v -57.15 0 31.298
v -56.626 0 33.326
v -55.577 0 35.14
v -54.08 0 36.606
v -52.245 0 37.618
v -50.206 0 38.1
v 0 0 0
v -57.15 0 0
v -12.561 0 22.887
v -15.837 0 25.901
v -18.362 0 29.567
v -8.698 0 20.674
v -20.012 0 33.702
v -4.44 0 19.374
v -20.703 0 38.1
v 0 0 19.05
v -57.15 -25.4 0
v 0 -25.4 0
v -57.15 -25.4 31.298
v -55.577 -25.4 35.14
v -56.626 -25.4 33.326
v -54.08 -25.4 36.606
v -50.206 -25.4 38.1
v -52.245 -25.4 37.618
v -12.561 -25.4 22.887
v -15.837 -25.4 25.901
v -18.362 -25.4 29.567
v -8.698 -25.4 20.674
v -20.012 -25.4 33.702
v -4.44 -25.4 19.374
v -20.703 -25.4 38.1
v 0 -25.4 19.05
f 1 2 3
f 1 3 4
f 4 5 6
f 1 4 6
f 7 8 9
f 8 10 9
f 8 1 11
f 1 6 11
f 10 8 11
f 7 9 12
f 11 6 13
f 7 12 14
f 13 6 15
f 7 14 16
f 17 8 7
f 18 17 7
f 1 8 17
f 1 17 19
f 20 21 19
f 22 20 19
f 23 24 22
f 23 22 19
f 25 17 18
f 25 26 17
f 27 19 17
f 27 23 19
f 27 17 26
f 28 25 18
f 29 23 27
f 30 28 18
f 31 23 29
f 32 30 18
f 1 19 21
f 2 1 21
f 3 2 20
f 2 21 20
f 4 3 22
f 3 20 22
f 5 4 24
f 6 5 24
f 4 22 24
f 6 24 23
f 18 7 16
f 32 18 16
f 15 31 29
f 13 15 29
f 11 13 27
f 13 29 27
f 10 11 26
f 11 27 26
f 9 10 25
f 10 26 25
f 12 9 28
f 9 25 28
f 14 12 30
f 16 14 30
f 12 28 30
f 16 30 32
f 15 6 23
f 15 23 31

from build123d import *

# Parameters (mm, degrees)
F0_W     = 57.15
F0_H     = 38.1
F1_DEPTH = 25.4
F3_DEPTH = 25.4


with BuildPart() as f1:
    # F0 (on Front) → F1 (new body)
    with BuildSketch(Plane.XZ):
        with Locations((-28.575, 19.05)):
            Rectangle(F0_W, F0_H)
    extrude(amount=F1_DEPTH)

    # F2 (on face) → F3 (cut)
    with BuildSketch(Plane.XZ.offset(25.4)):
        with BuildLine():
            Line((0, 38.1), (-20.702738, 38.1))
            ThreePointArc((-20.702738, 38.1), (-14.283178, 24.302075), (0, 19.05))
            Line((0, 19.05), (0, 38.1))
        make_face()
        with BuildLine():
            ThreePointArc((-57.15, 31.297673), (-54.878227, 35.924092), (-50.205953, 38.1))
            Line((-50.205953, 38.1), (-57.15, 38.1))
            Line((-57.15, 38.1), (-57.15, 31.297673))
        make_face()
    extrude(amount=-F3_DEPTH, mode=Mode.SUBTRACT)


solid = f1.part
